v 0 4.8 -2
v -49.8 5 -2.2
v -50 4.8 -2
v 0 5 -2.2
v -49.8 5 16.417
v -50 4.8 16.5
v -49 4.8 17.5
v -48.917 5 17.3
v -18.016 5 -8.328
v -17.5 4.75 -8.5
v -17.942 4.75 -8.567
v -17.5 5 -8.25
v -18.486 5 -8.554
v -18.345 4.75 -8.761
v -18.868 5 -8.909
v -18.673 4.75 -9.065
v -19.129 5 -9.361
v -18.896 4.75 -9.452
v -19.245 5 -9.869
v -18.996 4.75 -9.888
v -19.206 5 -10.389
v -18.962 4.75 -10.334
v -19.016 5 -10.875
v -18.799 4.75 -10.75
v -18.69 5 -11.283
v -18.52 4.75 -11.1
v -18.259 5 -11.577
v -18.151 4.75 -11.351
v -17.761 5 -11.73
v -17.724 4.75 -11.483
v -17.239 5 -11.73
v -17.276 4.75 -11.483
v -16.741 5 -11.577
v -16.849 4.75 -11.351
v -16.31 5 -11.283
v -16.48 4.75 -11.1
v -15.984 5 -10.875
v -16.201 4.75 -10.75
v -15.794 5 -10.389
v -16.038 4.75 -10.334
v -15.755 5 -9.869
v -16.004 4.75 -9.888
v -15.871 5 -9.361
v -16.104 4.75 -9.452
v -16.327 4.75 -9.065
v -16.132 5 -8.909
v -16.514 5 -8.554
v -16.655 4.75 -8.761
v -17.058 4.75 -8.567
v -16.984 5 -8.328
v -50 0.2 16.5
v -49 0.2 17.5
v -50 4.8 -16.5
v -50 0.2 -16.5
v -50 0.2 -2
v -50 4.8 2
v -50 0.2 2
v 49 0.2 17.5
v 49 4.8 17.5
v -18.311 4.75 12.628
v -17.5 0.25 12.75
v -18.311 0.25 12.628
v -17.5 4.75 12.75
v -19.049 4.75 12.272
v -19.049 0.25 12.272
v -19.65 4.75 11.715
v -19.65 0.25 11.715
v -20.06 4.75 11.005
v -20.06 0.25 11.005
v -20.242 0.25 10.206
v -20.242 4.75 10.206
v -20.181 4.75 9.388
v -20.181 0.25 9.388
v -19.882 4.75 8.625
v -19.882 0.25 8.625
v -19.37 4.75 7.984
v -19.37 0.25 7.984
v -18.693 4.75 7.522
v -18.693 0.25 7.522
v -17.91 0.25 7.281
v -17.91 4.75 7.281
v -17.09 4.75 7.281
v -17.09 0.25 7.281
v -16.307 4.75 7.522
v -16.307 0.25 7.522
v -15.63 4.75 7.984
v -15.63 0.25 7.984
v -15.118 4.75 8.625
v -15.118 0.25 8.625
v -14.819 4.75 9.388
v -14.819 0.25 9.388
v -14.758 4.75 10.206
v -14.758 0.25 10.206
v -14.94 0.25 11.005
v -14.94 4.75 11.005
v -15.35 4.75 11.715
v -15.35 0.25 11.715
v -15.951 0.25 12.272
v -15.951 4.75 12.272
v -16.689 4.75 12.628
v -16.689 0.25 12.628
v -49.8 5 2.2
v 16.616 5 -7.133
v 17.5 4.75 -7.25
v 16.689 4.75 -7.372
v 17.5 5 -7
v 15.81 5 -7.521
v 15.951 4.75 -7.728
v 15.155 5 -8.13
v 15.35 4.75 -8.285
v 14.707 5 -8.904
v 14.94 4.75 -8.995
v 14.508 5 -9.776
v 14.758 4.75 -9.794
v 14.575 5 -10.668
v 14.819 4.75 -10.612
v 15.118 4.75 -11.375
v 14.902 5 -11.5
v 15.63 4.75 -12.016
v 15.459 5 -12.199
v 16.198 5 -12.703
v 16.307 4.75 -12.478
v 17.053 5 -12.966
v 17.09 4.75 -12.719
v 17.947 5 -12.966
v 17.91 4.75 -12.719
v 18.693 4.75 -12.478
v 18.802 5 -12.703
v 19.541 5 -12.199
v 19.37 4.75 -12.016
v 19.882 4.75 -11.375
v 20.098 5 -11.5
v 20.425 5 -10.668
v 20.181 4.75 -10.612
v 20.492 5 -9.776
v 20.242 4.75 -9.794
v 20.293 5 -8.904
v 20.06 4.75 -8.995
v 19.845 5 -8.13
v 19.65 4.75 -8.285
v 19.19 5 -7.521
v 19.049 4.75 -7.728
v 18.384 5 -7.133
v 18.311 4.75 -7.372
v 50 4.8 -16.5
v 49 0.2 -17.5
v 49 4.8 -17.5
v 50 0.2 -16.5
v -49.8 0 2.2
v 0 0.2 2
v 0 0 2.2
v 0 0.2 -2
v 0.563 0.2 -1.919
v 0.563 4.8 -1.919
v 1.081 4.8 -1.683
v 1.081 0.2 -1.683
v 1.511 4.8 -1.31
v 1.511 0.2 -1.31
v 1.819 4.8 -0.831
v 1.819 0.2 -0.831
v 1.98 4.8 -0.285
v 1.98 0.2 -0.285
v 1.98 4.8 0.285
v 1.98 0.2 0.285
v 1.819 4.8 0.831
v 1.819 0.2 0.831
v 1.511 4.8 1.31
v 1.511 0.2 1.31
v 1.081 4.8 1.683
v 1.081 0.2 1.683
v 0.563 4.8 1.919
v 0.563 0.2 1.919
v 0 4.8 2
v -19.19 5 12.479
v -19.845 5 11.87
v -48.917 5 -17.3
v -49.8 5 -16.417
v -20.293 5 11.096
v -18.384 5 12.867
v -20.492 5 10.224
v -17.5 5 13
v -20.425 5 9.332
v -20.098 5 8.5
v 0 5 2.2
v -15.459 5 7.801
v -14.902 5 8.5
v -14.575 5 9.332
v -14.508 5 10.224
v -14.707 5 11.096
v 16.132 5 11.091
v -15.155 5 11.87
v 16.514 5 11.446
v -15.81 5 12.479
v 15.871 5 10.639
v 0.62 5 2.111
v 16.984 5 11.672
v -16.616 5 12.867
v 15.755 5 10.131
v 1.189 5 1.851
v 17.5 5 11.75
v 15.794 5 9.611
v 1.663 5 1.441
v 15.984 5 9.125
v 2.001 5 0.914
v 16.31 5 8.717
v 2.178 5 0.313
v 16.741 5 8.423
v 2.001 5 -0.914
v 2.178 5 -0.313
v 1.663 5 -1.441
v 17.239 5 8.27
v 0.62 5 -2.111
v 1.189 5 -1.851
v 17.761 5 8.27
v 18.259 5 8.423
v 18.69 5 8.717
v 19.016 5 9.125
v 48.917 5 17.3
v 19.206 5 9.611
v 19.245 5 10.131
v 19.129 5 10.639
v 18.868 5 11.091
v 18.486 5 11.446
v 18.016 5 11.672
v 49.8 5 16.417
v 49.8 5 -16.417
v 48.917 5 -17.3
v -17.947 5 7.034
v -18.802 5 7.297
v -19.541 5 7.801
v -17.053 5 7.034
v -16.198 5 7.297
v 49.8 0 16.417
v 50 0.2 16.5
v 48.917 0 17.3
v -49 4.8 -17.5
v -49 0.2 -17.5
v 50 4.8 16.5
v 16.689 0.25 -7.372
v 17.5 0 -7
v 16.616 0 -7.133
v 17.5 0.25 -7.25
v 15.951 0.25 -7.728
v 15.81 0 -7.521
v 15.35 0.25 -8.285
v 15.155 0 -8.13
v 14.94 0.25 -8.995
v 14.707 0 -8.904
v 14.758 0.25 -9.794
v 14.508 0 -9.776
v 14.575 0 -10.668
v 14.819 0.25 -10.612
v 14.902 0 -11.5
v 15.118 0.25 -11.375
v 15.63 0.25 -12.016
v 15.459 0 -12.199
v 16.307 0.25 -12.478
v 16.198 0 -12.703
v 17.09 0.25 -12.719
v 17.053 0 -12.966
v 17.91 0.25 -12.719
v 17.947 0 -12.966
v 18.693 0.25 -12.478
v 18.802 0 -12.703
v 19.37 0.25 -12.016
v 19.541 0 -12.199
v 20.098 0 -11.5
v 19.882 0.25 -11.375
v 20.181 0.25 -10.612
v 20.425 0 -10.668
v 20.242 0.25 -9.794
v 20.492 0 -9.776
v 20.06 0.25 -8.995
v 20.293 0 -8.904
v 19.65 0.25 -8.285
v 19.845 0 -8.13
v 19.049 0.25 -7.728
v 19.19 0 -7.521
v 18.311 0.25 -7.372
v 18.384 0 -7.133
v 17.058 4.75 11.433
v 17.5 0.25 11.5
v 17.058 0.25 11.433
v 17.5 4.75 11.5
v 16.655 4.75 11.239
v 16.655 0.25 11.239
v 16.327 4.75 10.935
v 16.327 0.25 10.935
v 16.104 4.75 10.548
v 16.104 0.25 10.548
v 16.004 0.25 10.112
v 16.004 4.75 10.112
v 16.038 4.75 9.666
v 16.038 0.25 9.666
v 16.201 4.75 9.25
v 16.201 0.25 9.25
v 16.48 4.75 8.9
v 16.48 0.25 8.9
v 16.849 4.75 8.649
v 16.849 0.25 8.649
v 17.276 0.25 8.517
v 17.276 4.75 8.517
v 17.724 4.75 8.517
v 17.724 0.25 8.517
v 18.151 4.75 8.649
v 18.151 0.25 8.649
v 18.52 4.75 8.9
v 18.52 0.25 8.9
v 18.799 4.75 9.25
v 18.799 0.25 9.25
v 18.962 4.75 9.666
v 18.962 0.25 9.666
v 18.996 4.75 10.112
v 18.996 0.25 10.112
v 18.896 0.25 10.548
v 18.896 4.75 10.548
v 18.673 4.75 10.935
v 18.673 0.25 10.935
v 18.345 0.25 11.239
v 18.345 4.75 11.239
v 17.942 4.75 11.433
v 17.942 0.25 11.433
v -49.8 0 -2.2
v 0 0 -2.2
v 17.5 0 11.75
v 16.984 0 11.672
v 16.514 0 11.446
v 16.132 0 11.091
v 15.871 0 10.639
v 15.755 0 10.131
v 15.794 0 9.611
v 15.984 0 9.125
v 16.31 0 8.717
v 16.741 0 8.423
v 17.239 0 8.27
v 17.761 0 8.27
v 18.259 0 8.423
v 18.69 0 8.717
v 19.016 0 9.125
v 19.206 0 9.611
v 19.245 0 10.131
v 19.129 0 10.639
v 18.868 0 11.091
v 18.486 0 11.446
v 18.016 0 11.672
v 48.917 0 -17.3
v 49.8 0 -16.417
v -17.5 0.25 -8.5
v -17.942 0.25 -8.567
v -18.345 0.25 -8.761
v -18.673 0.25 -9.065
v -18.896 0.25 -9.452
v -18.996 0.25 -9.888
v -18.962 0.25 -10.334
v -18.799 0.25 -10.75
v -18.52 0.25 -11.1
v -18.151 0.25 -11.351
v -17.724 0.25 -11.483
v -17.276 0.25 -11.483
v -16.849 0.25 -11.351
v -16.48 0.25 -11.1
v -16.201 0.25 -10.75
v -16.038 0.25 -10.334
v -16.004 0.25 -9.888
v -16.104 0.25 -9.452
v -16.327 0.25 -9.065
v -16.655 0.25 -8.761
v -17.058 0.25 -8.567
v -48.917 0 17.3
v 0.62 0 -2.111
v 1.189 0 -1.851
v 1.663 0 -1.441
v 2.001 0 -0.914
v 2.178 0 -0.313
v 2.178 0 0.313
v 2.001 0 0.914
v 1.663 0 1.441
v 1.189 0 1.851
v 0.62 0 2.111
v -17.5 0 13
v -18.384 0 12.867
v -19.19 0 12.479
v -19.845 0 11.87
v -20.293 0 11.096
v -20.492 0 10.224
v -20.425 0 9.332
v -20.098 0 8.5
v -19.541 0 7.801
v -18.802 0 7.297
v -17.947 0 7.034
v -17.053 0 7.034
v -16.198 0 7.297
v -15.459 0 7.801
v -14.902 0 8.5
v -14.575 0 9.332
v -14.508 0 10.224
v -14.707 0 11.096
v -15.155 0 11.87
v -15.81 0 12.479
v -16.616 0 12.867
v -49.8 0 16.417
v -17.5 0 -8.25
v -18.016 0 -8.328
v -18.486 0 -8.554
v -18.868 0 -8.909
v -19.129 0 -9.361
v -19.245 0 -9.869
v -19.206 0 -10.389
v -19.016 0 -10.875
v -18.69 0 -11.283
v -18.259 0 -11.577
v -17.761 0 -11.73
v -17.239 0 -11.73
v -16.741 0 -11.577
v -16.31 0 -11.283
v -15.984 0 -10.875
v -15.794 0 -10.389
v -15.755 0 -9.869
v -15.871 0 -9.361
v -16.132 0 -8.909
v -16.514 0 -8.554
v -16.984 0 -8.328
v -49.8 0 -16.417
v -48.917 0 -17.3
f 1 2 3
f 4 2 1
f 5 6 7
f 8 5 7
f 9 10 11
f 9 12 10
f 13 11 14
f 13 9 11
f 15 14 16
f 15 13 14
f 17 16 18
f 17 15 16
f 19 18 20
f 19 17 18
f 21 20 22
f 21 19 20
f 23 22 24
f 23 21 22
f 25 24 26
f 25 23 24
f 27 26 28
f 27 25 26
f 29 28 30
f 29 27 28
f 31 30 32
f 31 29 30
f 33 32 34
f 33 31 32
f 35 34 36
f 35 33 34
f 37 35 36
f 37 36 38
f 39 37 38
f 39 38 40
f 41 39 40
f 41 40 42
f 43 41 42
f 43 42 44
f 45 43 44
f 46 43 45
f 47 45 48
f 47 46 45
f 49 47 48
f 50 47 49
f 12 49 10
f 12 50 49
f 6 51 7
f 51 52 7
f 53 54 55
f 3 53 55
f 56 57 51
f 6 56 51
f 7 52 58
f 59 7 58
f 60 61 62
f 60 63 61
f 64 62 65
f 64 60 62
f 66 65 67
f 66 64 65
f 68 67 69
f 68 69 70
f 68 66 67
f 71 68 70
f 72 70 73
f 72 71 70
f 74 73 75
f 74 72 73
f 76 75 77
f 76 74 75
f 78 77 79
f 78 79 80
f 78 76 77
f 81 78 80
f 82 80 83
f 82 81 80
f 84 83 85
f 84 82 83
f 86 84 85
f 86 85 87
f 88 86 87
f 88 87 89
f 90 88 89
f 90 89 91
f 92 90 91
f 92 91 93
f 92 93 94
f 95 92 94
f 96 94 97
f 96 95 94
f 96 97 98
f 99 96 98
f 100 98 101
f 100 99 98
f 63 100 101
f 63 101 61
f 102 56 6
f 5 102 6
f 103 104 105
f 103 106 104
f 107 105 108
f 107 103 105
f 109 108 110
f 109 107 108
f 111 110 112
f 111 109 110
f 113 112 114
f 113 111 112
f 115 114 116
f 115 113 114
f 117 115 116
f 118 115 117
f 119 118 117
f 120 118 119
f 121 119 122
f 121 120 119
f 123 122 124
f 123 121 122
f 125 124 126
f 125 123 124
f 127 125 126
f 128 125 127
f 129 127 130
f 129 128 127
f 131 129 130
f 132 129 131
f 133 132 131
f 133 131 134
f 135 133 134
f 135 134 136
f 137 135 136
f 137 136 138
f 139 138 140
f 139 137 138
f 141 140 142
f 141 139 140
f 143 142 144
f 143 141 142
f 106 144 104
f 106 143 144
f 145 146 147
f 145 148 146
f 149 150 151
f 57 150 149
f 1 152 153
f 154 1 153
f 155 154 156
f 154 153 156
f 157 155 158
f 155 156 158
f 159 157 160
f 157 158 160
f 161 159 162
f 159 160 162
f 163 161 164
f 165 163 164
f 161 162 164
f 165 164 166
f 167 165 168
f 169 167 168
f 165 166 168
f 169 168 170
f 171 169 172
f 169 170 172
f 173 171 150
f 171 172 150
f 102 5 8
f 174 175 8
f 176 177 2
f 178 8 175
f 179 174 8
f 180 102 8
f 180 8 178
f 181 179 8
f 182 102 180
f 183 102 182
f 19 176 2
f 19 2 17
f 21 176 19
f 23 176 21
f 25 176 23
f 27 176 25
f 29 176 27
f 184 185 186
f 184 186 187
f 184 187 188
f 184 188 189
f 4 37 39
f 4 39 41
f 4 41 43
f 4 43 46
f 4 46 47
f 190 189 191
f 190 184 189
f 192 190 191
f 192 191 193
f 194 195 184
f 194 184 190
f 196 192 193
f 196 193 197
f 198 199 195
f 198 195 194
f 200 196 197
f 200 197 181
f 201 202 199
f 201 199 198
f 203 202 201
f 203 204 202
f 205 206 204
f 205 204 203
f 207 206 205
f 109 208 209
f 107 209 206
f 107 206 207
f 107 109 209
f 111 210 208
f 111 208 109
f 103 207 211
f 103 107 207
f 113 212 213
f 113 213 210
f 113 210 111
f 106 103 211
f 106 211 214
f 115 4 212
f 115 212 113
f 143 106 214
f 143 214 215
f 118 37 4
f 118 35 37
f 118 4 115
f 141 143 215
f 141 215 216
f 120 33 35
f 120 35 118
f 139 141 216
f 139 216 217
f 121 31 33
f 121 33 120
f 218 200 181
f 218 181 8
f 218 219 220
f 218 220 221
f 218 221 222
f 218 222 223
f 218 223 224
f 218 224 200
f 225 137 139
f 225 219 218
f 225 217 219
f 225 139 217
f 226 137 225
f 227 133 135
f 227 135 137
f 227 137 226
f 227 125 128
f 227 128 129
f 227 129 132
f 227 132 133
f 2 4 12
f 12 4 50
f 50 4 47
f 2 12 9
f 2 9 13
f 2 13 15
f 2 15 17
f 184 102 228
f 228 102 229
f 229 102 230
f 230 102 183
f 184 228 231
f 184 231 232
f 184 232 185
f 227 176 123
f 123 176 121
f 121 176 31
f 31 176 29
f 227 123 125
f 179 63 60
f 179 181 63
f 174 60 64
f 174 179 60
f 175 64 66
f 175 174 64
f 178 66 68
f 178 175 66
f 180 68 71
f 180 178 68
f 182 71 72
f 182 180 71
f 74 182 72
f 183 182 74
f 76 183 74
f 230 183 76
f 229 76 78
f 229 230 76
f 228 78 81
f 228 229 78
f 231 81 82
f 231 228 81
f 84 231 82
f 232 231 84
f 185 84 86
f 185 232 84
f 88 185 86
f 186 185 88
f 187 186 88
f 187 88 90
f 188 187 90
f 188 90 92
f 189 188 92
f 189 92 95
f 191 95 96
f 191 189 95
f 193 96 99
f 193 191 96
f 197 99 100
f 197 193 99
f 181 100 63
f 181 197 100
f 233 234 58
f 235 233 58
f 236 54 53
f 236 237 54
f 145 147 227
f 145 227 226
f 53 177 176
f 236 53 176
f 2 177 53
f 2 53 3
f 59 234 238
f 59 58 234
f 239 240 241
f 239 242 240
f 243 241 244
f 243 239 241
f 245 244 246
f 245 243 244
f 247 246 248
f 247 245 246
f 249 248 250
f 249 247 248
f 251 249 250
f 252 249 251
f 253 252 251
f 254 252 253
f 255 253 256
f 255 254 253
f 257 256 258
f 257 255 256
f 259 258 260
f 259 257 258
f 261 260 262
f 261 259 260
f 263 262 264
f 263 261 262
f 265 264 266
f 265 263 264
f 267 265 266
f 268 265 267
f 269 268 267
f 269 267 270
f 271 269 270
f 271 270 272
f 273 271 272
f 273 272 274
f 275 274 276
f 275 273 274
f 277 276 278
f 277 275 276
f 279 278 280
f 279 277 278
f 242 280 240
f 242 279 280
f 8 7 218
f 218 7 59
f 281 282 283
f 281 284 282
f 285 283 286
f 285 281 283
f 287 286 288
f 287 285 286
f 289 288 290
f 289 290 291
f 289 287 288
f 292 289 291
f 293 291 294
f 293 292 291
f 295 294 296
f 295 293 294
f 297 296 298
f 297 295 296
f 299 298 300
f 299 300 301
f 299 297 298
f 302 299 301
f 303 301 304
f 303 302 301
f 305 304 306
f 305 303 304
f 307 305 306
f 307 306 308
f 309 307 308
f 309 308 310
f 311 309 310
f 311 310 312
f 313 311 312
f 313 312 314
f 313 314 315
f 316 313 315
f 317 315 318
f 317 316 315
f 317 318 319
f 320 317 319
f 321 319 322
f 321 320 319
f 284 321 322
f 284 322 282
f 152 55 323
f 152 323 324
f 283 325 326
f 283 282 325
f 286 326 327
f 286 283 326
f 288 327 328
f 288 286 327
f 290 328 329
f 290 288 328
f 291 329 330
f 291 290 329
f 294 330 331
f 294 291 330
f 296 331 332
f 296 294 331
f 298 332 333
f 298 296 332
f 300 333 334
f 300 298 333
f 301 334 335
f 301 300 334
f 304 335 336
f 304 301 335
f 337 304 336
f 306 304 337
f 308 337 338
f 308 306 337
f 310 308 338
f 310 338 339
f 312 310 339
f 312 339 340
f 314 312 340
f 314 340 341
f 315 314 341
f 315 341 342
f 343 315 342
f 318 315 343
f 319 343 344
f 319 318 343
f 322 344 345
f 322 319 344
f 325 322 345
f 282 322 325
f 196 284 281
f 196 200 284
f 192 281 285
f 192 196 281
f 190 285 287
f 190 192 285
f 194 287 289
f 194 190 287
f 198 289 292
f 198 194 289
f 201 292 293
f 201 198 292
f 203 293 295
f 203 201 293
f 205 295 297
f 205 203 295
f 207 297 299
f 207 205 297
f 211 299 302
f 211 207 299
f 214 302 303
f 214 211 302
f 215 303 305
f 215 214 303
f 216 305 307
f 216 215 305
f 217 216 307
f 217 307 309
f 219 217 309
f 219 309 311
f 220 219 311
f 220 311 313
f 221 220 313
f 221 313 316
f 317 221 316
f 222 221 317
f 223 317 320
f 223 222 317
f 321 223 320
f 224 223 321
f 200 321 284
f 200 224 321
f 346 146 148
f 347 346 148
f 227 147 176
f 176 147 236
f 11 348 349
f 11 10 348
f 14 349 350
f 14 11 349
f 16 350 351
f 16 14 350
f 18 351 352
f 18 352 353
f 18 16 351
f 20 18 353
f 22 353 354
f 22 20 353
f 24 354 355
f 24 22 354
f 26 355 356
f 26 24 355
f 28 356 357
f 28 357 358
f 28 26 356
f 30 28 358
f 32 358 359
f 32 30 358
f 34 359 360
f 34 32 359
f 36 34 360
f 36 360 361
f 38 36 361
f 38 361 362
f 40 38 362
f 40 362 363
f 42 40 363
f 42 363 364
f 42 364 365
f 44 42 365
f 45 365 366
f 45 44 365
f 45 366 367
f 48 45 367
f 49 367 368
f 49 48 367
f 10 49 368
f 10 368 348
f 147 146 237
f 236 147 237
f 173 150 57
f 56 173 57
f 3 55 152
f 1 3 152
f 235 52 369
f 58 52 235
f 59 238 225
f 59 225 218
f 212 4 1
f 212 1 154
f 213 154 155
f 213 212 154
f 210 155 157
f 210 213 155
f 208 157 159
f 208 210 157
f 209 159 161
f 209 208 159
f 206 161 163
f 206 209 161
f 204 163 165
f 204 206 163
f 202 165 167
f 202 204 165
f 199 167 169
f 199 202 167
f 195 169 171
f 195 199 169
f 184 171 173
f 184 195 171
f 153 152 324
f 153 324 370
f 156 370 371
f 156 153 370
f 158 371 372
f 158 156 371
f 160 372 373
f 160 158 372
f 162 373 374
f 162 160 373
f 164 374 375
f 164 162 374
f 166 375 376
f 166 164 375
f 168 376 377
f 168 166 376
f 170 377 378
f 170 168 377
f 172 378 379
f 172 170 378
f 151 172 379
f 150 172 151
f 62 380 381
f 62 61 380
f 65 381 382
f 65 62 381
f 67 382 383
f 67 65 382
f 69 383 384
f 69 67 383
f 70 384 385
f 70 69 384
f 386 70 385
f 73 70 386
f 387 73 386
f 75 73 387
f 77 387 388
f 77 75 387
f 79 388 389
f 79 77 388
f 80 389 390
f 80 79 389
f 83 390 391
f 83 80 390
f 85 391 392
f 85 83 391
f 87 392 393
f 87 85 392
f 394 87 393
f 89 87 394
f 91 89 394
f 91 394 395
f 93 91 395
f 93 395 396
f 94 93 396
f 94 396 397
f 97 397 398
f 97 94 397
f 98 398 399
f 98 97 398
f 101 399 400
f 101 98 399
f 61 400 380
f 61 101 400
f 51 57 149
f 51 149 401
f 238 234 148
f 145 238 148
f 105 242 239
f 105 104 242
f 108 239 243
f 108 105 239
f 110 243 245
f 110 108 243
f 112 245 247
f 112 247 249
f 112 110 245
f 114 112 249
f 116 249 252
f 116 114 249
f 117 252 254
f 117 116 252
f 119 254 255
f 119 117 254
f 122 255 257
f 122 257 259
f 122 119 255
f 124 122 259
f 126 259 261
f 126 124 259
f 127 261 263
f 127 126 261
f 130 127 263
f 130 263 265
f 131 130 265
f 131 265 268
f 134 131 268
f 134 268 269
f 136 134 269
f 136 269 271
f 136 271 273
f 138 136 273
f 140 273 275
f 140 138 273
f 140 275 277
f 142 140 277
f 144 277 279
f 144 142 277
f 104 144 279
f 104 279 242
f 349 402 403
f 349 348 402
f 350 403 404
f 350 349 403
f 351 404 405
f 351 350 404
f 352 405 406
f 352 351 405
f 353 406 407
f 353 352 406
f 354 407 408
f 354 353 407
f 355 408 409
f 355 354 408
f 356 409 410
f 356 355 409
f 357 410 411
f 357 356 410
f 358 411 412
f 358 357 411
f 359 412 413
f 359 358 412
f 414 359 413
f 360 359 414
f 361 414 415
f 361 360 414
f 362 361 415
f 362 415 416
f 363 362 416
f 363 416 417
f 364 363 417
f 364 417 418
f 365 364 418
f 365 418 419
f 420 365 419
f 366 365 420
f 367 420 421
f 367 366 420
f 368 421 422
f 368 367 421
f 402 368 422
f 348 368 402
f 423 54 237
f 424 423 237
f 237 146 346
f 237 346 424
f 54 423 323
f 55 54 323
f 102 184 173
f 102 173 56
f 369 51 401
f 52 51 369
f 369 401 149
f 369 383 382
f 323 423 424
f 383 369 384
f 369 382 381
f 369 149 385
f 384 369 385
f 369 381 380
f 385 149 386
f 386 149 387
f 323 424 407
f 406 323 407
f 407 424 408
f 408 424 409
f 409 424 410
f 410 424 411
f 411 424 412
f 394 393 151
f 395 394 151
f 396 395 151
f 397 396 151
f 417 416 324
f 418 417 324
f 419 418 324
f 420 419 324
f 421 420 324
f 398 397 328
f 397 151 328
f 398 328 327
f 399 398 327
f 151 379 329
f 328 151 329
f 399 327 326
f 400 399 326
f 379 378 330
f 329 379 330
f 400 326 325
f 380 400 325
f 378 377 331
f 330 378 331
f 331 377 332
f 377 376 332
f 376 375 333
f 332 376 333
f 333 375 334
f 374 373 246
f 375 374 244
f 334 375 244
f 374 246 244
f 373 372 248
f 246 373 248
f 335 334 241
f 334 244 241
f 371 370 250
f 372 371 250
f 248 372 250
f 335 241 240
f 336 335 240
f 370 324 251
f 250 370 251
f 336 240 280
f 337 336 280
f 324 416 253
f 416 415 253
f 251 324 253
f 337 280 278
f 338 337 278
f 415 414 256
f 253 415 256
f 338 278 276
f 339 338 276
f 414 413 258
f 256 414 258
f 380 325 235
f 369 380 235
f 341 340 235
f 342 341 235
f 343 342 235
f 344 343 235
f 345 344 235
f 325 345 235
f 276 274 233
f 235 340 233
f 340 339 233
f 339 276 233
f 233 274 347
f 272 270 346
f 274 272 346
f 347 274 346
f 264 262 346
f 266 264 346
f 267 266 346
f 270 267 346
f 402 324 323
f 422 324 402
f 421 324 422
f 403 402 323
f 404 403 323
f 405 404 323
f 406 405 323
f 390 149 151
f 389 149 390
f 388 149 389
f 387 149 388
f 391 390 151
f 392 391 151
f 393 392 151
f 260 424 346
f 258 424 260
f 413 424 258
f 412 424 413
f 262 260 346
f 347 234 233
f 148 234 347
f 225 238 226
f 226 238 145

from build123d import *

# Parameters (mm, degrees)
BOSS_EXTRUDE1_DEPTH            = 5
F_3_0MM_DOWEL_HOLE1_AT_2_COUNT = 2
F_3_0MM_DOWEL_HOLE1_AT_2_PITCH = 40.311288741
M5_CLEARANCE_HOLE1_AT_2_COUNT  = 2
M5_CLEARANCE_HOLE1_AT_2_PITCH  = 40.311288741
CHAMFER1_SIZE                  = 1
CHAMFER2_SIZE                  = 0.2


with BuildPart() as part:
    # Sketch2 → Boss-Extrude1 (new body)
    with BuildSketch(Plane(origin=(0, 0, 0), x_dir=(1, 0, 0), z_dir=(0, 1, 0))):
        with BuildLine():
            Line((-50, 2), (0, 2))
            ThreePointArc((0, 2), (2, 0), (0, -2))
            Line((0, -2), (-50, -2))
            Line((-50, -2), (-50, -17.5))
            Line((-50, -17.5), (50, -17.5))
            Line((50, -17.5), (50, 17.5))
            Line((50, 17.5), (-50, 17.5))
            Line((-50, 17.5), (-50, 2))
        make_face()
    extrude(amount=BOSS_EXTRUDE1_DEPTH)

    # Sketch4 → Ø3.0mm Dowel Hole1 (revolve, cut)
    with BuildSketch(Plane(origin=(-17.5, 5, -10), x_dir=(0, 0, 1), z_dir=(1, 0, 0))):
        Polygon((0, 0), (0, 5), (1.75, 5), (1.5, 4.75), (1.5, 0.25), (1.75, 0), align=None)
    f_3_0mm_dowel_hole1 = revolve(axis=Axis((-17.5, 11.35, -10), (0, -1, 0)), mode=Mode.SUBTRACT)

    # Ø3.0mm Dowel Hole1 at 2: Ø3.0mm Dowel Hole1 ×2
    with Locations(*[Vector(0.8682431421244593, 0, 0.4961389383568337) * (i * F_3_0MM_DOWEL_HOLE1_AT_2_PITCH) for i in range(1, F_3_0MM_DOWEL_HOLE1_AT_2_COUNT)]):
        add(f_3_0mm_dowel_hole1, mode=Mode.SUBTRACT)

    # Sketch6 → M5 Clearance Hole1 (revolve, cut)
    with BuildSketch(Plane(origin=(-17.5, 5, 10), x_dir=(0, 0, 1), z_dir=(1, 0, 0))):
        Polygon((0, 0), (0, 5), (3, 5), (2.75, 4.75), (2.75, 0.25), (3, 0), align=None)
    m5_clearance_hole1 = revolve(axis=Axis((-17.5, 11.35, 10), (0, -1, 0)), mode=Mode.SUBTRACT)

    # M5 Clearance Hole1 at 2: M5 Clearance Hole1 ×2
    with Locations(*[Vector(0.8682431421244592, 0, -0.4961389383568339) * (i * M5_CLEARANCE_HOLE1_AT_2_PITCH) for i in range(1, M5_CLEARANCE_HOLE1_AT_2_COUNT)]):
        add(m5_clearance_hole1, mode=Mode.SUBTRACT)

    # Chamfer1
    chamfer1_edges = [part.edges().sort_by_distance(p)[0] for p in [
        (50, 2.5, 17.5),
        (-50, 2.5, 17.5),
        (-50, 2.5, -17.5),
        (50, 2.5, -17.5),
    ]]
    chamfer(chamfer1_edges, length=CHAMFER1_SIZE)

    # Chamfer2
    chamfer2_edges = [part.edges().sort_by_distance(p)[0] for p in [
        (-25, 0, -2),
        (-25, 5, -2),
        (2, 5, 0),
        (-25, 5, 2),
        (-50, 5, 9.25),
        (0, 0, -17.5),
        (0, 5, -17.5),
        (50, 0, 0),
        (0, 0, 17.5),
        (-50, 0, -9.25),
        (-49.5, 0, -17),
        (-49.5, 0, 17),
        (49.5, 0, 17),
        (49.5, 0, -17),
        (50, 5, 0),
        (-50, 5, -9.25),
        (0, 5, 17.5),
        (-49.5, 5, -17),
        (-49.5, 5, 17),
        (49.5, 5, 17),
        (49.5, 5, -17),
        (-50, 0, 9.25),
        (-25, 0, 2),
        (2, 0, 0),
    ]]
    chamfer(chamfer2_edges, length=CHAMFER2_SIZE)


solid = part.part
